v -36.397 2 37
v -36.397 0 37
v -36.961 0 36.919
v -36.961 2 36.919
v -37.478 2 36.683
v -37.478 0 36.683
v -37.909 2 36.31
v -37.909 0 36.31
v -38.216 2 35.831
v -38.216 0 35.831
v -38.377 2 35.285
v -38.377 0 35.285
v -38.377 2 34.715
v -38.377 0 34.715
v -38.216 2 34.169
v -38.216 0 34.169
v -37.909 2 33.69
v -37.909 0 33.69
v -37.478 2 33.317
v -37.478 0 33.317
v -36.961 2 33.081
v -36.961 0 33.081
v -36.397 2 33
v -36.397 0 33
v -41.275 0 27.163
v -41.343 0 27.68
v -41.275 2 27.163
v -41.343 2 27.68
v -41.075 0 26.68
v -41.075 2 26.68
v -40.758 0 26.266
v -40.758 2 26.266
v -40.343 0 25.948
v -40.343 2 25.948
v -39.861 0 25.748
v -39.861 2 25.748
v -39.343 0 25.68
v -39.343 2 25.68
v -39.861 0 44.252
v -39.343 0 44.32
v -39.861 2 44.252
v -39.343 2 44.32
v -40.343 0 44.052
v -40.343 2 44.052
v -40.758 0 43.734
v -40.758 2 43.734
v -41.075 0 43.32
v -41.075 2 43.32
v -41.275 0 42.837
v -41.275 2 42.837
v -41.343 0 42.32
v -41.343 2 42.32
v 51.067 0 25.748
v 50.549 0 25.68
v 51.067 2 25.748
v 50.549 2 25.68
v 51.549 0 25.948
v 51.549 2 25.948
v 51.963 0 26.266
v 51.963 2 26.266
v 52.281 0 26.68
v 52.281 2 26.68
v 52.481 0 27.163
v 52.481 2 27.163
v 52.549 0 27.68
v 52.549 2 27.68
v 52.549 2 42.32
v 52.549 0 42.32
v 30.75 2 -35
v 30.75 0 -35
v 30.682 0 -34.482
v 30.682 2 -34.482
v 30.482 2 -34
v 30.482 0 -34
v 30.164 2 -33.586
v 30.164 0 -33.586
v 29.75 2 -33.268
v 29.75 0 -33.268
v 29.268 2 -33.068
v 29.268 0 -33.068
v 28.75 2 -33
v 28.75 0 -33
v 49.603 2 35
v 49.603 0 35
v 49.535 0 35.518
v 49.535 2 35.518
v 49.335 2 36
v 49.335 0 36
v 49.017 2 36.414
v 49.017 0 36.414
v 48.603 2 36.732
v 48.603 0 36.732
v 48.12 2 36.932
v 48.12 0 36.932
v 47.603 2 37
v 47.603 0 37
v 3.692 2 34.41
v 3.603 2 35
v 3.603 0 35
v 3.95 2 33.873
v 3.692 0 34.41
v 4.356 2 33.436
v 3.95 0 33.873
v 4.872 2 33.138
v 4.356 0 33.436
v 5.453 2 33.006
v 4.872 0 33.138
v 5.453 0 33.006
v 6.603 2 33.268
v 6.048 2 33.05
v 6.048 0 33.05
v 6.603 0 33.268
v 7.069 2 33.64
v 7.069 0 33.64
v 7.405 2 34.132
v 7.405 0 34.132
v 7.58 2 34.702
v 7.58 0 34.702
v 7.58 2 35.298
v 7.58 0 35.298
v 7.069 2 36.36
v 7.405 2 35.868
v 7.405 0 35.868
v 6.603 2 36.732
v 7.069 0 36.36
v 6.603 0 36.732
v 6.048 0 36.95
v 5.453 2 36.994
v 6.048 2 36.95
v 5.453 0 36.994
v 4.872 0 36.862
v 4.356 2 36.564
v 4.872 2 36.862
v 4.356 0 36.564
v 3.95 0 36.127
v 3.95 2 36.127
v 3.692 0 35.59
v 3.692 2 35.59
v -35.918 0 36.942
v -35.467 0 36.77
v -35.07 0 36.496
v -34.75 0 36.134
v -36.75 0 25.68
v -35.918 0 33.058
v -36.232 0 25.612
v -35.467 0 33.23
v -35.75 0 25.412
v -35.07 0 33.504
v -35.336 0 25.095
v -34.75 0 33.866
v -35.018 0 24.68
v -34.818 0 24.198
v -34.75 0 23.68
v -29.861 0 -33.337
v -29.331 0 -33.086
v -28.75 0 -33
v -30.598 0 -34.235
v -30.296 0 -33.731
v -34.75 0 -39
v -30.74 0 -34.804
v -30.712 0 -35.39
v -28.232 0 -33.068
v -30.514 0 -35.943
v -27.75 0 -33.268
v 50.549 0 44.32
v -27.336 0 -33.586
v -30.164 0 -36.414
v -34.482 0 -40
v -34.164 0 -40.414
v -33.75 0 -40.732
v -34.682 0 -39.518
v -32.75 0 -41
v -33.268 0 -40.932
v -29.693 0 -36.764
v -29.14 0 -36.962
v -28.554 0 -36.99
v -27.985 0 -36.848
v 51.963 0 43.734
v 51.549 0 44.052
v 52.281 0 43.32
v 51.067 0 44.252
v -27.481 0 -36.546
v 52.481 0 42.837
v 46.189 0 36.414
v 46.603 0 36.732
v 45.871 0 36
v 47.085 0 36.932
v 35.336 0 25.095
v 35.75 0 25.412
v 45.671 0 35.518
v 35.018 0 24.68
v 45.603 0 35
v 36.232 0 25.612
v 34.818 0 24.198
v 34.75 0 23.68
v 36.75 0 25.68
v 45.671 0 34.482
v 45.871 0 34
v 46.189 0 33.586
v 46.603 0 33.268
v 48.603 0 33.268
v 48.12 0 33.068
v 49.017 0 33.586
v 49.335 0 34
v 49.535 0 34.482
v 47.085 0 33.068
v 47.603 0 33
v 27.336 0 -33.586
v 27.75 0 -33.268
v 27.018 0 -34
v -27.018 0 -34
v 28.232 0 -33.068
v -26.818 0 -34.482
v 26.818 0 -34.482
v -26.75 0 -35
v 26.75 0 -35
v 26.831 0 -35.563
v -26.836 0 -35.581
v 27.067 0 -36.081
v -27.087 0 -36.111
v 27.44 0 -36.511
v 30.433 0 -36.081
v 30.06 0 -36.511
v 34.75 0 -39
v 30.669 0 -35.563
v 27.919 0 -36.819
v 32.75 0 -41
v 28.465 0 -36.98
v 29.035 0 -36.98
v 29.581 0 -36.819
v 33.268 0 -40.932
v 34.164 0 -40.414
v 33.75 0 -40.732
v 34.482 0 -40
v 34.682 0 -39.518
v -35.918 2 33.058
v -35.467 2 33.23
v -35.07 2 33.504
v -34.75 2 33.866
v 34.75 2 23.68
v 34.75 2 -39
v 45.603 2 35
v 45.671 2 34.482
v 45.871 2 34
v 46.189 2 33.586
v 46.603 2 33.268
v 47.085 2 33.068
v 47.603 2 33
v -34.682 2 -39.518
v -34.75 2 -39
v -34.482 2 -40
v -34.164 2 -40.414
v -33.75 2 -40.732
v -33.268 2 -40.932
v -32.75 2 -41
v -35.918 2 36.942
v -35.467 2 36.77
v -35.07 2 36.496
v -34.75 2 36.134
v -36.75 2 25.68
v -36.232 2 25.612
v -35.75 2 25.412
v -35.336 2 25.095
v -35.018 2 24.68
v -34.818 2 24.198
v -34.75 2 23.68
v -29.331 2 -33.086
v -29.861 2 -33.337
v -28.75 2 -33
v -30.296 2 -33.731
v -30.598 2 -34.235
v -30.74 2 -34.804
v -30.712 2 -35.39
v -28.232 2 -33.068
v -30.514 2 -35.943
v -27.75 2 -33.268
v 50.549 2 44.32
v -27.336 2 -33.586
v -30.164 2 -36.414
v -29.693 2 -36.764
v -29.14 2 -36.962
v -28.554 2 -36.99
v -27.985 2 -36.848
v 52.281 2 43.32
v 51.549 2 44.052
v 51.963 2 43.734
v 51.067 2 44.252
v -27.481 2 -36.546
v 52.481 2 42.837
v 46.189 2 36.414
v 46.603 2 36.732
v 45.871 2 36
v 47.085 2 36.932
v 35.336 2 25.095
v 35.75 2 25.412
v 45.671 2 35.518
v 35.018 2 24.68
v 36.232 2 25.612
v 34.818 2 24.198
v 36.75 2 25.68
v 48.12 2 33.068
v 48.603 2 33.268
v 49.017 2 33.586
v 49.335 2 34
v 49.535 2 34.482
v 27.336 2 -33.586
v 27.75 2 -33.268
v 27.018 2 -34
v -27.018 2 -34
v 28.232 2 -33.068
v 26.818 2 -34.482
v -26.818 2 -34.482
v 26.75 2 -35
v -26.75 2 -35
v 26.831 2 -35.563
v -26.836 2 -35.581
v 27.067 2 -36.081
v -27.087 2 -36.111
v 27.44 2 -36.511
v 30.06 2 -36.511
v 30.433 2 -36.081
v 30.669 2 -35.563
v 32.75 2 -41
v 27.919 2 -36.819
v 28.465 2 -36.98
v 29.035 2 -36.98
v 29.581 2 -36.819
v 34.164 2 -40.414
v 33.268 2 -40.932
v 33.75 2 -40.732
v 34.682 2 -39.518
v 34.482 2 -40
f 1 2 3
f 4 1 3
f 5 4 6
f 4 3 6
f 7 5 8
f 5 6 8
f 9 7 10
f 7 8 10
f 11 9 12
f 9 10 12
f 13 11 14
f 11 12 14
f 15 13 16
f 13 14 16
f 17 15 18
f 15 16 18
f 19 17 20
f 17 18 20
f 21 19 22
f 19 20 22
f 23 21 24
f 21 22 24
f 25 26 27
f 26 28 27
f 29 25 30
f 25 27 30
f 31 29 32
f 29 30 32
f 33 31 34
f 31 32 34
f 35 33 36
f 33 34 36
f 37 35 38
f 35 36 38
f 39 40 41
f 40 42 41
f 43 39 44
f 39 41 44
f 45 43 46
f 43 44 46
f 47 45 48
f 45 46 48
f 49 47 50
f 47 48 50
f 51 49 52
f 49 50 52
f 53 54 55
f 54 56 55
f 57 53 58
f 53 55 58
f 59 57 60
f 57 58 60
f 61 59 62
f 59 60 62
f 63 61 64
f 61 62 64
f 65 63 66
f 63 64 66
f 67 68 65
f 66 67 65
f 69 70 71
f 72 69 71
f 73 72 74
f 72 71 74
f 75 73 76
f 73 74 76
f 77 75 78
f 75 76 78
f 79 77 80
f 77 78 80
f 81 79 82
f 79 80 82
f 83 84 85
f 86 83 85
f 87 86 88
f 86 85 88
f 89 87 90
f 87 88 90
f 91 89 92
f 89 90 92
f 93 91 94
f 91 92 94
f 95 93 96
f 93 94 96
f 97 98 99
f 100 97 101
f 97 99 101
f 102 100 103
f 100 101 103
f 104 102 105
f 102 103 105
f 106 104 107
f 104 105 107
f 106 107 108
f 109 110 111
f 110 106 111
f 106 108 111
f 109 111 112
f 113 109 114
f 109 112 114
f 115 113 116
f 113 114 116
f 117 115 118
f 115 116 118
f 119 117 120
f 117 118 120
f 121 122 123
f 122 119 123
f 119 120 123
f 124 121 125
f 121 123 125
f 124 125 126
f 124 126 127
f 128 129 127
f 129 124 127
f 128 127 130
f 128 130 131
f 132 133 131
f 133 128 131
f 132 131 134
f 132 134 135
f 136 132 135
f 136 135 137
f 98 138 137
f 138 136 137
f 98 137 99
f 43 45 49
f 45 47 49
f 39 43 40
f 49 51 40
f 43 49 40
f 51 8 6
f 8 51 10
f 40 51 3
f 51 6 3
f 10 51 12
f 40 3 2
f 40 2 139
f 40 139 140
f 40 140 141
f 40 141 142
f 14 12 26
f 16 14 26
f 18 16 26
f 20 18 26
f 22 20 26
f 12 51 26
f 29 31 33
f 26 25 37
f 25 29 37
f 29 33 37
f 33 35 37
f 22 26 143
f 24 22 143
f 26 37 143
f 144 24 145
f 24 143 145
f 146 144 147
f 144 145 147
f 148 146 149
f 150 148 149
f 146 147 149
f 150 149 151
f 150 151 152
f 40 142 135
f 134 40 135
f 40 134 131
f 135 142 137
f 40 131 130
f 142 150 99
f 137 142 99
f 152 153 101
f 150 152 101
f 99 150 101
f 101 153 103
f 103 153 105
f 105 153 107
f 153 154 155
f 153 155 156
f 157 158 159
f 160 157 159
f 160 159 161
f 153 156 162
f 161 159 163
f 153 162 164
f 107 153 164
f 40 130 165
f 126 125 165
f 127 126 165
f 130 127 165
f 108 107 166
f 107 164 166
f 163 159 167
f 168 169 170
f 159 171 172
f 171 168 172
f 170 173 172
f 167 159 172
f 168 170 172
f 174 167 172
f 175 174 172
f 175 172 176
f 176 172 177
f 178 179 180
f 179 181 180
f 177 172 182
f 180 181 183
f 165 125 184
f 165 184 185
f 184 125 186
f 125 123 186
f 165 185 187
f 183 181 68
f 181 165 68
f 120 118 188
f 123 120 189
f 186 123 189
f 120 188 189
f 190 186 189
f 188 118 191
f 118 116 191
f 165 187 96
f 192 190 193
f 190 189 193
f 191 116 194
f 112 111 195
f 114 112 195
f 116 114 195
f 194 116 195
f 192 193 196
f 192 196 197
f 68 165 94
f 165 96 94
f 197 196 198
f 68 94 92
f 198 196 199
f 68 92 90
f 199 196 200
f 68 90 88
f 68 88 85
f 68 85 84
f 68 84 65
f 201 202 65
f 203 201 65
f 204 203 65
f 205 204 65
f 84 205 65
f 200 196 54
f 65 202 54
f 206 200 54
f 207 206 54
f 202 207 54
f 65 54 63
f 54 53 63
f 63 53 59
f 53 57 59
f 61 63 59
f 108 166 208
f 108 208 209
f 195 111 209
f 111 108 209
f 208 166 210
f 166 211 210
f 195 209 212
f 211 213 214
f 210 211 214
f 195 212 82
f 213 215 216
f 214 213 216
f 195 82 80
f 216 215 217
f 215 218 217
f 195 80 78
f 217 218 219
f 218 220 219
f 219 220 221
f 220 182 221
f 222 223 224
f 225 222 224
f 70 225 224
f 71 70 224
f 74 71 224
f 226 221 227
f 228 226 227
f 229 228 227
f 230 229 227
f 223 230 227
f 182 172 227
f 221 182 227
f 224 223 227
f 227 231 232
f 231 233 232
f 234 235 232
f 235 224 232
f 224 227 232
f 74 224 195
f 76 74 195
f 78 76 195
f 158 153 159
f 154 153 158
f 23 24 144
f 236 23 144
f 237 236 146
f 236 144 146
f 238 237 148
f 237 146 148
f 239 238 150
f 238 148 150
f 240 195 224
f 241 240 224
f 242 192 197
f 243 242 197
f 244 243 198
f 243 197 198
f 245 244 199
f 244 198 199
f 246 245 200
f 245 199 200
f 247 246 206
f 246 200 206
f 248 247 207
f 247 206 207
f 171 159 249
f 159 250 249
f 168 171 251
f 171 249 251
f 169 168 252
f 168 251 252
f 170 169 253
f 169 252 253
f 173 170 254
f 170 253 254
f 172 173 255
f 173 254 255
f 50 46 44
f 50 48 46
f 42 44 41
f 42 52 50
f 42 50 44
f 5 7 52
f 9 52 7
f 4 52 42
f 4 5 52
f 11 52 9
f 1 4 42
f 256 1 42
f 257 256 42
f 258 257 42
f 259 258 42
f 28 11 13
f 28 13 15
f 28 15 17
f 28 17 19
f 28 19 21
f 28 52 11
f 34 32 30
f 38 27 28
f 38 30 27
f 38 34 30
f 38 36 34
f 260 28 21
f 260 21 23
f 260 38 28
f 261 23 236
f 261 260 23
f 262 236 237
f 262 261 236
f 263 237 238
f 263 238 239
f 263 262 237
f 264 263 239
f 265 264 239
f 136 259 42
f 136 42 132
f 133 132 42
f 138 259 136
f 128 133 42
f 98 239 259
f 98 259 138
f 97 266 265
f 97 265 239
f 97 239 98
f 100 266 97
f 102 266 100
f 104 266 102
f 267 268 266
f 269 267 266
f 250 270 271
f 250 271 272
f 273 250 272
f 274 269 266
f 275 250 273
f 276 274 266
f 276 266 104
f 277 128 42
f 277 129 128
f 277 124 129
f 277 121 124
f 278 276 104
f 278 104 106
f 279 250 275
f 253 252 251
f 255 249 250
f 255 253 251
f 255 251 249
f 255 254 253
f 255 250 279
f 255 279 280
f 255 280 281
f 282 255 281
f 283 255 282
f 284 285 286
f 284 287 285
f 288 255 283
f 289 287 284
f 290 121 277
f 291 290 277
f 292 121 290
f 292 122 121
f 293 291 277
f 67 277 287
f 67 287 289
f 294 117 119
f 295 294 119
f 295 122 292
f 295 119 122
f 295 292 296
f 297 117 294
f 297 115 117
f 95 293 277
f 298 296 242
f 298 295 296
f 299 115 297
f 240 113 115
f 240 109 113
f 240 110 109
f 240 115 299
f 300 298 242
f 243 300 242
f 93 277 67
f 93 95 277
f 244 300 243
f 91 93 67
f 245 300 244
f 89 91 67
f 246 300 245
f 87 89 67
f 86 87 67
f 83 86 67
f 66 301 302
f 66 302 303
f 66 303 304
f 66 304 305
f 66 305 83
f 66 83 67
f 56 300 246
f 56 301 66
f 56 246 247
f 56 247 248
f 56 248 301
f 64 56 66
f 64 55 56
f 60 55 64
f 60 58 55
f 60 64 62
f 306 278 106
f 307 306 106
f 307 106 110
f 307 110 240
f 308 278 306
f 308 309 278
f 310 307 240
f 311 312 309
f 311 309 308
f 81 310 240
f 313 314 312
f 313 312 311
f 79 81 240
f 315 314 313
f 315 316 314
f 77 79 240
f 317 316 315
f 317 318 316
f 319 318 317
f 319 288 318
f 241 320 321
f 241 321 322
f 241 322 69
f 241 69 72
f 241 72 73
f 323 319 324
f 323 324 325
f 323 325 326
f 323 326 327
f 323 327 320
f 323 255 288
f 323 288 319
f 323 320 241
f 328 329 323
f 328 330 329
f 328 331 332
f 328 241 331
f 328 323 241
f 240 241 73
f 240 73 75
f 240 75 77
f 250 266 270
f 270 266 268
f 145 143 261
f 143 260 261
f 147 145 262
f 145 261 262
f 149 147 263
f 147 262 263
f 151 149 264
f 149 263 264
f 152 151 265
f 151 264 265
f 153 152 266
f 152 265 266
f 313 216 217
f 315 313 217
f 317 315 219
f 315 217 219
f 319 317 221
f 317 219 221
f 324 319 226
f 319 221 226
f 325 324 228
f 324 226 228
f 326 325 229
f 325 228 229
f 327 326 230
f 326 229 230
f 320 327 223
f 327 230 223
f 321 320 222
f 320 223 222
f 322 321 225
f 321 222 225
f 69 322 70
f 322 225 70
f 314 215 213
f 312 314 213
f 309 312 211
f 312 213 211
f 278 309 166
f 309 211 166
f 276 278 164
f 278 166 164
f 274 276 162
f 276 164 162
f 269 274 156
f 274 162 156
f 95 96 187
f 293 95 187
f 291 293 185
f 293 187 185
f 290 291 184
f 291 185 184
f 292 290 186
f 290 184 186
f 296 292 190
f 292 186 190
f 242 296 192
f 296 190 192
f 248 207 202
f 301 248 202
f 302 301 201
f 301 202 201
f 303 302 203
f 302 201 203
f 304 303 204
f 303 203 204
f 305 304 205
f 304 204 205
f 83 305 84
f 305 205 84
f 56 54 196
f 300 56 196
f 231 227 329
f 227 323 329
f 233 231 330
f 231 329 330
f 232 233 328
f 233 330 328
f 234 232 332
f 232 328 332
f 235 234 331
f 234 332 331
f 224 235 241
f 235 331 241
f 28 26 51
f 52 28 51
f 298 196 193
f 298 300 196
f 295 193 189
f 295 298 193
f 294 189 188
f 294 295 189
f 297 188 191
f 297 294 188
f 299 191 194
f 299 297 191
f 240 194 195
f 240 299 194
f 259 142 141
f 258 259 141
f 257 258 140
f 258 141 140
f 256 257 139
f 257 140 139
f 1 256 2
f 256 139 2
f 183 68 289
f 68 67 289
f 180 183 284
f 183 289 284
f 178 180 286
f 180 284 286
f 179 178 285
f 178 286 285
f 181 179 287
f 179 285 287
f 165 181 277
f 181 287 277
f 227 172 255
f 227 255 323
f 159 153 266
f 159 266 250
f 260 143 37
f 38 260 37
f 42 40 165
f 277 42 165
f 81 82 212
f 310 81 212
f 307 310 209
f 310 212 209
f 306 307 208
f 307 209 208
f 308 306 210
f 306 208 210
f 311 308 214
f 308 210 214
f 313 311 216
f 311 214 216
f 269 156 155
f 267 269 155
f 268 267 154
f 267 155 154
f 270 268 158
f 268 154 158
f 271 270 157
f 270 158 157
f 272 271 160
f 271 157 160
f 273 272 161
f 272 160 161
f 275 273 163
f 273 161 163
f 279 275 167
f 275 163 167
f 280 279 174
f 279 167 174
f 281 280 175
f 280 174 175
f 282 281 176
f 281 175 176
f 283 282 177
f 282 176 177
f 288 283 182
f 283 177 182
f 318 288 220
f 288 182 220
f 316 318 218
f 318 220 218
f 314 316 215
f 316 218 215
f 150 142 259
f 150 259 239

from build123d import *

# Parameters (mm, degrees)
SKETCH1_W           = 69.5
SKETCH1_H           = 82
BOSS_EXTRUDE1_DEPTH = 2
BOSS_EXTRUDE3_START = -2
BOSS_EXTRUDE3_DEPTH = 2
FILLET1_R           = 2


with BuildPart() as part:
    # Sketch1 → Boss-Extrude1 (new body)
    # profile 1 of 2: a face of its own
    with BuildSketch(Plane(origin=(0, 0, 0), x_dir=(1, 0, 0), z_dir=(0, 1, 0))):
        Rectangle(SKETCH1_W, SKETCH1_H)
        with BuildLine():
            ThreePointArc((7.602792708, -35), (5.602792708, -37), (3.602792708, -35))
            Line((3.602792708, -35), (-28.75, -35))
            Line((-28.75, -35), (-28.75, 33))
            ThreePointArc((-28.75, 33), (-30.164213562, 36.414213562), (-26.75, 35))
            Line((-26.75, 35), (26.75, 35))
            ThreePointArc((26.75, 35), (28.75, 37), (30.75, 35))
            ThreePointArc((30.75, 35), (30.164213562, 33.585786438), (28.75, 33))
            Line((28.75, 33), (28.75, -35))
            Line((28.75, -35), (7.602792708, -35))
        make_face(mode=Mode.SUBTRACT)
    # profile 2 of 2: a face of its own
    with BuildSketch(Plane(origin=(0, 0, 0), x_dir=(1, 0, 0), z_dir=(0, 1, 0))):
        with BuildLine():
            Line((-28.75, -35), (3.602792708, -35))
            ThreePointArc((3.602792708, -35), (5.602792708, -33), (7.602792708, -35))
            Line((7.602792708, -35), (28.75, -35))
            Line((28.75, -35), (28.75, 33))
            ThreePointArc((28.75, 33), (27.335786438, 33.585786438), (26.75, 35))
            Line((26.75, 35), (-26.75, 35))
            ThreePointArc((-26.75, 35), (-27.335786438, 33.585786438), (-28.75, 33))
            Line((-28.75, 33), (-28.75, -35))
        make_face()
    extrude(amount=BOSS_EXTRUDE1_DEPTH)

    # Sketch2 → Boss-Extrude3 (add)
    with BuildSketch(Plane(origin=(0, 2, 0), x_dir=(1, 0, 0), z_dir=(0, 1, 0)).offset(BOSS_EXTRUDE3_START)):
        with BuildLine():
            Line((47.602792708, -40.964572004), (34.75, -40.964572004))
            Line((34.75, -40.964572004), (34.75, -41))
            Line((34.75, -41), (-34.75, -41))
            Line((-34.75, -41), (-34.75, -40.964572004))
            Line((-34.75, -40.964572004), (-36.397207292, -40.964572004))
            Line((-36.397207292, -40.964572004), (-36.397207292, -37))
            ThreePointArc((-36.397207292, -37), (-38.397207292, -35), (-36.397207292, -33))
            Line((-36.397207292, -33), (-36.397207292, -29.035427996))
            Line((-36.397207292, -29.035427996), (-34.75, -29.035427996))
            Line((-34.75, -29.035427996), (-34.75, -25.680337555))
            Line((-34.75, -25.680337555), (-41.343372537, -25.680337555))
            Line((-41.343372537, -25.680337555), (-41.343372537, -44.319662445))
            Line((-41.343372537, -44.319662445), (52.548957953, -44.319662445))
            Line((52.548957953, -44.319662445), (52.548957953, -25.680337555))
            Line((52.548957953, -25.680337555), (34.75, -25.680337555))
            Line((34.75, -25.680337555), (34.75, -29.035427996))
            Line((34.75, -29.035427996), (47.602792708, -29.035427996))
            Line((47.602792708, -29.035427996), (47.602792708, -33))
            ThreePointArc((47.602792708, -33), (49.01700627, -33.585786438), (49.602792708, -35))
            ThreePointArc((49.602792708, -35), (49.01700627, -36.414213562), (47.602792708, -37))
            Line((47.602792708, -37), (47.602792708, -40.964572004))
        make_face()
        with BuildLine():
            ThreePointArc((7.602792708, -35), (5.602792708, -37), (3.602792708, -35))
            Line((3.602792708, -35), (-34.397207292, -35))
            ThreePointArc((-34.397207292, -35), (-34.487441, -35.593963558), (-34.75, -36.134331582))
            Line((-34.75, -36.134331582), (-34.75, -40.964572004))
            Line((-34.75, -40.964572004), (34.75, -40.964572004))
            Line((34.75, -40.964572004), (34.75, -35))
            Line((34.75, -35), (7.602792708, -35))
        make_face()
        with BuildLine():
            Line((-34.397207292, -35), (3.602792708, -35))
            ThreePointArc((3.602792708, -35), (5.602792708, -33), (7.602792708, -35))
            Line((7.602792708, -35), (34.75, -35))
            Line((34.75, -35), (34.75, -29.035427996))
            Line((34.75, -29.035427996), (-34.75, -29.035427996))
            Line((-34.75, -29.035427996), (-34.75, -33.865668418))
            ThreePointArc((-34.75, -33.865668418), (-34.487441, -34.406036442), (-34.397207292, -35))
        make_face()
        with BuildLine():
            Line((45.602792708, -35), (34.75, -35))
            Line((34.75, -35), (34.75, -40.964572004))
            Line((34.75, -40.964572004), (47.602792708, -40.964572004))
            Line((47.602792708, -40.964572004), (47.602792708, -37))
            ThreePointArc((47.602792708, -37), (46.188579146, -36.414213562), (45.602792708, -35))
        make_face()
        with BuildLine():
            Line((34.75, -29.035427996), (34.75, -35))
            Line((34.75, -35), (45.602792708, -35))
            ThreePointArc((45.602792708, -35), (46.188579146, -33.585786438), (47.602792708, -33))
            Line((47.602792708, -33), (47.602792708, -29.035427996))
            Line((47.602792708, -29.035427996), (34.75, -29.035427996))
        make_face()
        with BuildLine():
            Line((-34.75, -40.964572004), (-34.75, -36.134331582))
            ThreePointArc((-34.75, -36.134331582), (-35.466794256, -36.770404355), (-36.397207292, -37))
            Line((-36.397207292, -37), (-36.397207292, -40.964572004))
            Line((-36.397207292, -40.964572004), (-34.75, -40.964572004))
        make_face()
        with BuildLine():
            ThreePointArc((-36.397207292, -33), (-35.466794256, -33.229595645), (-34.75, -33.865668418))
            Line((-34.75, -33.865668418), (-34.75, -29.035427996))
            Line((-34.75, -29.035427996), (-36.397207292, -29.035427996))
            Line((-36.397207292, -29.035427996), (-36.397207292, -33))
        make_face()
    extrude(amount=BOSS_EXTRUDE3_DEPTH)

    # Fillet1
    fillet1_edges = [part.edges().sort_by_distance(p)[0] for p in [
        (34.75, 1, -41),
        (-34.75, 1, -41),
        (34.75, 1, 25.680337555),
        (52.548957953, 1, 25.680337555),
        (52.548957953, 1, 44.319662445),
        (-41.343372537, 1, 44.319662445),
        (-41.343372537, 1, 25.680337555),
        (-34.75, 1, 25.680337555),
    ]]
    fillet(fillet1_edges, radius=FILLET1_R)


solid = part.part
